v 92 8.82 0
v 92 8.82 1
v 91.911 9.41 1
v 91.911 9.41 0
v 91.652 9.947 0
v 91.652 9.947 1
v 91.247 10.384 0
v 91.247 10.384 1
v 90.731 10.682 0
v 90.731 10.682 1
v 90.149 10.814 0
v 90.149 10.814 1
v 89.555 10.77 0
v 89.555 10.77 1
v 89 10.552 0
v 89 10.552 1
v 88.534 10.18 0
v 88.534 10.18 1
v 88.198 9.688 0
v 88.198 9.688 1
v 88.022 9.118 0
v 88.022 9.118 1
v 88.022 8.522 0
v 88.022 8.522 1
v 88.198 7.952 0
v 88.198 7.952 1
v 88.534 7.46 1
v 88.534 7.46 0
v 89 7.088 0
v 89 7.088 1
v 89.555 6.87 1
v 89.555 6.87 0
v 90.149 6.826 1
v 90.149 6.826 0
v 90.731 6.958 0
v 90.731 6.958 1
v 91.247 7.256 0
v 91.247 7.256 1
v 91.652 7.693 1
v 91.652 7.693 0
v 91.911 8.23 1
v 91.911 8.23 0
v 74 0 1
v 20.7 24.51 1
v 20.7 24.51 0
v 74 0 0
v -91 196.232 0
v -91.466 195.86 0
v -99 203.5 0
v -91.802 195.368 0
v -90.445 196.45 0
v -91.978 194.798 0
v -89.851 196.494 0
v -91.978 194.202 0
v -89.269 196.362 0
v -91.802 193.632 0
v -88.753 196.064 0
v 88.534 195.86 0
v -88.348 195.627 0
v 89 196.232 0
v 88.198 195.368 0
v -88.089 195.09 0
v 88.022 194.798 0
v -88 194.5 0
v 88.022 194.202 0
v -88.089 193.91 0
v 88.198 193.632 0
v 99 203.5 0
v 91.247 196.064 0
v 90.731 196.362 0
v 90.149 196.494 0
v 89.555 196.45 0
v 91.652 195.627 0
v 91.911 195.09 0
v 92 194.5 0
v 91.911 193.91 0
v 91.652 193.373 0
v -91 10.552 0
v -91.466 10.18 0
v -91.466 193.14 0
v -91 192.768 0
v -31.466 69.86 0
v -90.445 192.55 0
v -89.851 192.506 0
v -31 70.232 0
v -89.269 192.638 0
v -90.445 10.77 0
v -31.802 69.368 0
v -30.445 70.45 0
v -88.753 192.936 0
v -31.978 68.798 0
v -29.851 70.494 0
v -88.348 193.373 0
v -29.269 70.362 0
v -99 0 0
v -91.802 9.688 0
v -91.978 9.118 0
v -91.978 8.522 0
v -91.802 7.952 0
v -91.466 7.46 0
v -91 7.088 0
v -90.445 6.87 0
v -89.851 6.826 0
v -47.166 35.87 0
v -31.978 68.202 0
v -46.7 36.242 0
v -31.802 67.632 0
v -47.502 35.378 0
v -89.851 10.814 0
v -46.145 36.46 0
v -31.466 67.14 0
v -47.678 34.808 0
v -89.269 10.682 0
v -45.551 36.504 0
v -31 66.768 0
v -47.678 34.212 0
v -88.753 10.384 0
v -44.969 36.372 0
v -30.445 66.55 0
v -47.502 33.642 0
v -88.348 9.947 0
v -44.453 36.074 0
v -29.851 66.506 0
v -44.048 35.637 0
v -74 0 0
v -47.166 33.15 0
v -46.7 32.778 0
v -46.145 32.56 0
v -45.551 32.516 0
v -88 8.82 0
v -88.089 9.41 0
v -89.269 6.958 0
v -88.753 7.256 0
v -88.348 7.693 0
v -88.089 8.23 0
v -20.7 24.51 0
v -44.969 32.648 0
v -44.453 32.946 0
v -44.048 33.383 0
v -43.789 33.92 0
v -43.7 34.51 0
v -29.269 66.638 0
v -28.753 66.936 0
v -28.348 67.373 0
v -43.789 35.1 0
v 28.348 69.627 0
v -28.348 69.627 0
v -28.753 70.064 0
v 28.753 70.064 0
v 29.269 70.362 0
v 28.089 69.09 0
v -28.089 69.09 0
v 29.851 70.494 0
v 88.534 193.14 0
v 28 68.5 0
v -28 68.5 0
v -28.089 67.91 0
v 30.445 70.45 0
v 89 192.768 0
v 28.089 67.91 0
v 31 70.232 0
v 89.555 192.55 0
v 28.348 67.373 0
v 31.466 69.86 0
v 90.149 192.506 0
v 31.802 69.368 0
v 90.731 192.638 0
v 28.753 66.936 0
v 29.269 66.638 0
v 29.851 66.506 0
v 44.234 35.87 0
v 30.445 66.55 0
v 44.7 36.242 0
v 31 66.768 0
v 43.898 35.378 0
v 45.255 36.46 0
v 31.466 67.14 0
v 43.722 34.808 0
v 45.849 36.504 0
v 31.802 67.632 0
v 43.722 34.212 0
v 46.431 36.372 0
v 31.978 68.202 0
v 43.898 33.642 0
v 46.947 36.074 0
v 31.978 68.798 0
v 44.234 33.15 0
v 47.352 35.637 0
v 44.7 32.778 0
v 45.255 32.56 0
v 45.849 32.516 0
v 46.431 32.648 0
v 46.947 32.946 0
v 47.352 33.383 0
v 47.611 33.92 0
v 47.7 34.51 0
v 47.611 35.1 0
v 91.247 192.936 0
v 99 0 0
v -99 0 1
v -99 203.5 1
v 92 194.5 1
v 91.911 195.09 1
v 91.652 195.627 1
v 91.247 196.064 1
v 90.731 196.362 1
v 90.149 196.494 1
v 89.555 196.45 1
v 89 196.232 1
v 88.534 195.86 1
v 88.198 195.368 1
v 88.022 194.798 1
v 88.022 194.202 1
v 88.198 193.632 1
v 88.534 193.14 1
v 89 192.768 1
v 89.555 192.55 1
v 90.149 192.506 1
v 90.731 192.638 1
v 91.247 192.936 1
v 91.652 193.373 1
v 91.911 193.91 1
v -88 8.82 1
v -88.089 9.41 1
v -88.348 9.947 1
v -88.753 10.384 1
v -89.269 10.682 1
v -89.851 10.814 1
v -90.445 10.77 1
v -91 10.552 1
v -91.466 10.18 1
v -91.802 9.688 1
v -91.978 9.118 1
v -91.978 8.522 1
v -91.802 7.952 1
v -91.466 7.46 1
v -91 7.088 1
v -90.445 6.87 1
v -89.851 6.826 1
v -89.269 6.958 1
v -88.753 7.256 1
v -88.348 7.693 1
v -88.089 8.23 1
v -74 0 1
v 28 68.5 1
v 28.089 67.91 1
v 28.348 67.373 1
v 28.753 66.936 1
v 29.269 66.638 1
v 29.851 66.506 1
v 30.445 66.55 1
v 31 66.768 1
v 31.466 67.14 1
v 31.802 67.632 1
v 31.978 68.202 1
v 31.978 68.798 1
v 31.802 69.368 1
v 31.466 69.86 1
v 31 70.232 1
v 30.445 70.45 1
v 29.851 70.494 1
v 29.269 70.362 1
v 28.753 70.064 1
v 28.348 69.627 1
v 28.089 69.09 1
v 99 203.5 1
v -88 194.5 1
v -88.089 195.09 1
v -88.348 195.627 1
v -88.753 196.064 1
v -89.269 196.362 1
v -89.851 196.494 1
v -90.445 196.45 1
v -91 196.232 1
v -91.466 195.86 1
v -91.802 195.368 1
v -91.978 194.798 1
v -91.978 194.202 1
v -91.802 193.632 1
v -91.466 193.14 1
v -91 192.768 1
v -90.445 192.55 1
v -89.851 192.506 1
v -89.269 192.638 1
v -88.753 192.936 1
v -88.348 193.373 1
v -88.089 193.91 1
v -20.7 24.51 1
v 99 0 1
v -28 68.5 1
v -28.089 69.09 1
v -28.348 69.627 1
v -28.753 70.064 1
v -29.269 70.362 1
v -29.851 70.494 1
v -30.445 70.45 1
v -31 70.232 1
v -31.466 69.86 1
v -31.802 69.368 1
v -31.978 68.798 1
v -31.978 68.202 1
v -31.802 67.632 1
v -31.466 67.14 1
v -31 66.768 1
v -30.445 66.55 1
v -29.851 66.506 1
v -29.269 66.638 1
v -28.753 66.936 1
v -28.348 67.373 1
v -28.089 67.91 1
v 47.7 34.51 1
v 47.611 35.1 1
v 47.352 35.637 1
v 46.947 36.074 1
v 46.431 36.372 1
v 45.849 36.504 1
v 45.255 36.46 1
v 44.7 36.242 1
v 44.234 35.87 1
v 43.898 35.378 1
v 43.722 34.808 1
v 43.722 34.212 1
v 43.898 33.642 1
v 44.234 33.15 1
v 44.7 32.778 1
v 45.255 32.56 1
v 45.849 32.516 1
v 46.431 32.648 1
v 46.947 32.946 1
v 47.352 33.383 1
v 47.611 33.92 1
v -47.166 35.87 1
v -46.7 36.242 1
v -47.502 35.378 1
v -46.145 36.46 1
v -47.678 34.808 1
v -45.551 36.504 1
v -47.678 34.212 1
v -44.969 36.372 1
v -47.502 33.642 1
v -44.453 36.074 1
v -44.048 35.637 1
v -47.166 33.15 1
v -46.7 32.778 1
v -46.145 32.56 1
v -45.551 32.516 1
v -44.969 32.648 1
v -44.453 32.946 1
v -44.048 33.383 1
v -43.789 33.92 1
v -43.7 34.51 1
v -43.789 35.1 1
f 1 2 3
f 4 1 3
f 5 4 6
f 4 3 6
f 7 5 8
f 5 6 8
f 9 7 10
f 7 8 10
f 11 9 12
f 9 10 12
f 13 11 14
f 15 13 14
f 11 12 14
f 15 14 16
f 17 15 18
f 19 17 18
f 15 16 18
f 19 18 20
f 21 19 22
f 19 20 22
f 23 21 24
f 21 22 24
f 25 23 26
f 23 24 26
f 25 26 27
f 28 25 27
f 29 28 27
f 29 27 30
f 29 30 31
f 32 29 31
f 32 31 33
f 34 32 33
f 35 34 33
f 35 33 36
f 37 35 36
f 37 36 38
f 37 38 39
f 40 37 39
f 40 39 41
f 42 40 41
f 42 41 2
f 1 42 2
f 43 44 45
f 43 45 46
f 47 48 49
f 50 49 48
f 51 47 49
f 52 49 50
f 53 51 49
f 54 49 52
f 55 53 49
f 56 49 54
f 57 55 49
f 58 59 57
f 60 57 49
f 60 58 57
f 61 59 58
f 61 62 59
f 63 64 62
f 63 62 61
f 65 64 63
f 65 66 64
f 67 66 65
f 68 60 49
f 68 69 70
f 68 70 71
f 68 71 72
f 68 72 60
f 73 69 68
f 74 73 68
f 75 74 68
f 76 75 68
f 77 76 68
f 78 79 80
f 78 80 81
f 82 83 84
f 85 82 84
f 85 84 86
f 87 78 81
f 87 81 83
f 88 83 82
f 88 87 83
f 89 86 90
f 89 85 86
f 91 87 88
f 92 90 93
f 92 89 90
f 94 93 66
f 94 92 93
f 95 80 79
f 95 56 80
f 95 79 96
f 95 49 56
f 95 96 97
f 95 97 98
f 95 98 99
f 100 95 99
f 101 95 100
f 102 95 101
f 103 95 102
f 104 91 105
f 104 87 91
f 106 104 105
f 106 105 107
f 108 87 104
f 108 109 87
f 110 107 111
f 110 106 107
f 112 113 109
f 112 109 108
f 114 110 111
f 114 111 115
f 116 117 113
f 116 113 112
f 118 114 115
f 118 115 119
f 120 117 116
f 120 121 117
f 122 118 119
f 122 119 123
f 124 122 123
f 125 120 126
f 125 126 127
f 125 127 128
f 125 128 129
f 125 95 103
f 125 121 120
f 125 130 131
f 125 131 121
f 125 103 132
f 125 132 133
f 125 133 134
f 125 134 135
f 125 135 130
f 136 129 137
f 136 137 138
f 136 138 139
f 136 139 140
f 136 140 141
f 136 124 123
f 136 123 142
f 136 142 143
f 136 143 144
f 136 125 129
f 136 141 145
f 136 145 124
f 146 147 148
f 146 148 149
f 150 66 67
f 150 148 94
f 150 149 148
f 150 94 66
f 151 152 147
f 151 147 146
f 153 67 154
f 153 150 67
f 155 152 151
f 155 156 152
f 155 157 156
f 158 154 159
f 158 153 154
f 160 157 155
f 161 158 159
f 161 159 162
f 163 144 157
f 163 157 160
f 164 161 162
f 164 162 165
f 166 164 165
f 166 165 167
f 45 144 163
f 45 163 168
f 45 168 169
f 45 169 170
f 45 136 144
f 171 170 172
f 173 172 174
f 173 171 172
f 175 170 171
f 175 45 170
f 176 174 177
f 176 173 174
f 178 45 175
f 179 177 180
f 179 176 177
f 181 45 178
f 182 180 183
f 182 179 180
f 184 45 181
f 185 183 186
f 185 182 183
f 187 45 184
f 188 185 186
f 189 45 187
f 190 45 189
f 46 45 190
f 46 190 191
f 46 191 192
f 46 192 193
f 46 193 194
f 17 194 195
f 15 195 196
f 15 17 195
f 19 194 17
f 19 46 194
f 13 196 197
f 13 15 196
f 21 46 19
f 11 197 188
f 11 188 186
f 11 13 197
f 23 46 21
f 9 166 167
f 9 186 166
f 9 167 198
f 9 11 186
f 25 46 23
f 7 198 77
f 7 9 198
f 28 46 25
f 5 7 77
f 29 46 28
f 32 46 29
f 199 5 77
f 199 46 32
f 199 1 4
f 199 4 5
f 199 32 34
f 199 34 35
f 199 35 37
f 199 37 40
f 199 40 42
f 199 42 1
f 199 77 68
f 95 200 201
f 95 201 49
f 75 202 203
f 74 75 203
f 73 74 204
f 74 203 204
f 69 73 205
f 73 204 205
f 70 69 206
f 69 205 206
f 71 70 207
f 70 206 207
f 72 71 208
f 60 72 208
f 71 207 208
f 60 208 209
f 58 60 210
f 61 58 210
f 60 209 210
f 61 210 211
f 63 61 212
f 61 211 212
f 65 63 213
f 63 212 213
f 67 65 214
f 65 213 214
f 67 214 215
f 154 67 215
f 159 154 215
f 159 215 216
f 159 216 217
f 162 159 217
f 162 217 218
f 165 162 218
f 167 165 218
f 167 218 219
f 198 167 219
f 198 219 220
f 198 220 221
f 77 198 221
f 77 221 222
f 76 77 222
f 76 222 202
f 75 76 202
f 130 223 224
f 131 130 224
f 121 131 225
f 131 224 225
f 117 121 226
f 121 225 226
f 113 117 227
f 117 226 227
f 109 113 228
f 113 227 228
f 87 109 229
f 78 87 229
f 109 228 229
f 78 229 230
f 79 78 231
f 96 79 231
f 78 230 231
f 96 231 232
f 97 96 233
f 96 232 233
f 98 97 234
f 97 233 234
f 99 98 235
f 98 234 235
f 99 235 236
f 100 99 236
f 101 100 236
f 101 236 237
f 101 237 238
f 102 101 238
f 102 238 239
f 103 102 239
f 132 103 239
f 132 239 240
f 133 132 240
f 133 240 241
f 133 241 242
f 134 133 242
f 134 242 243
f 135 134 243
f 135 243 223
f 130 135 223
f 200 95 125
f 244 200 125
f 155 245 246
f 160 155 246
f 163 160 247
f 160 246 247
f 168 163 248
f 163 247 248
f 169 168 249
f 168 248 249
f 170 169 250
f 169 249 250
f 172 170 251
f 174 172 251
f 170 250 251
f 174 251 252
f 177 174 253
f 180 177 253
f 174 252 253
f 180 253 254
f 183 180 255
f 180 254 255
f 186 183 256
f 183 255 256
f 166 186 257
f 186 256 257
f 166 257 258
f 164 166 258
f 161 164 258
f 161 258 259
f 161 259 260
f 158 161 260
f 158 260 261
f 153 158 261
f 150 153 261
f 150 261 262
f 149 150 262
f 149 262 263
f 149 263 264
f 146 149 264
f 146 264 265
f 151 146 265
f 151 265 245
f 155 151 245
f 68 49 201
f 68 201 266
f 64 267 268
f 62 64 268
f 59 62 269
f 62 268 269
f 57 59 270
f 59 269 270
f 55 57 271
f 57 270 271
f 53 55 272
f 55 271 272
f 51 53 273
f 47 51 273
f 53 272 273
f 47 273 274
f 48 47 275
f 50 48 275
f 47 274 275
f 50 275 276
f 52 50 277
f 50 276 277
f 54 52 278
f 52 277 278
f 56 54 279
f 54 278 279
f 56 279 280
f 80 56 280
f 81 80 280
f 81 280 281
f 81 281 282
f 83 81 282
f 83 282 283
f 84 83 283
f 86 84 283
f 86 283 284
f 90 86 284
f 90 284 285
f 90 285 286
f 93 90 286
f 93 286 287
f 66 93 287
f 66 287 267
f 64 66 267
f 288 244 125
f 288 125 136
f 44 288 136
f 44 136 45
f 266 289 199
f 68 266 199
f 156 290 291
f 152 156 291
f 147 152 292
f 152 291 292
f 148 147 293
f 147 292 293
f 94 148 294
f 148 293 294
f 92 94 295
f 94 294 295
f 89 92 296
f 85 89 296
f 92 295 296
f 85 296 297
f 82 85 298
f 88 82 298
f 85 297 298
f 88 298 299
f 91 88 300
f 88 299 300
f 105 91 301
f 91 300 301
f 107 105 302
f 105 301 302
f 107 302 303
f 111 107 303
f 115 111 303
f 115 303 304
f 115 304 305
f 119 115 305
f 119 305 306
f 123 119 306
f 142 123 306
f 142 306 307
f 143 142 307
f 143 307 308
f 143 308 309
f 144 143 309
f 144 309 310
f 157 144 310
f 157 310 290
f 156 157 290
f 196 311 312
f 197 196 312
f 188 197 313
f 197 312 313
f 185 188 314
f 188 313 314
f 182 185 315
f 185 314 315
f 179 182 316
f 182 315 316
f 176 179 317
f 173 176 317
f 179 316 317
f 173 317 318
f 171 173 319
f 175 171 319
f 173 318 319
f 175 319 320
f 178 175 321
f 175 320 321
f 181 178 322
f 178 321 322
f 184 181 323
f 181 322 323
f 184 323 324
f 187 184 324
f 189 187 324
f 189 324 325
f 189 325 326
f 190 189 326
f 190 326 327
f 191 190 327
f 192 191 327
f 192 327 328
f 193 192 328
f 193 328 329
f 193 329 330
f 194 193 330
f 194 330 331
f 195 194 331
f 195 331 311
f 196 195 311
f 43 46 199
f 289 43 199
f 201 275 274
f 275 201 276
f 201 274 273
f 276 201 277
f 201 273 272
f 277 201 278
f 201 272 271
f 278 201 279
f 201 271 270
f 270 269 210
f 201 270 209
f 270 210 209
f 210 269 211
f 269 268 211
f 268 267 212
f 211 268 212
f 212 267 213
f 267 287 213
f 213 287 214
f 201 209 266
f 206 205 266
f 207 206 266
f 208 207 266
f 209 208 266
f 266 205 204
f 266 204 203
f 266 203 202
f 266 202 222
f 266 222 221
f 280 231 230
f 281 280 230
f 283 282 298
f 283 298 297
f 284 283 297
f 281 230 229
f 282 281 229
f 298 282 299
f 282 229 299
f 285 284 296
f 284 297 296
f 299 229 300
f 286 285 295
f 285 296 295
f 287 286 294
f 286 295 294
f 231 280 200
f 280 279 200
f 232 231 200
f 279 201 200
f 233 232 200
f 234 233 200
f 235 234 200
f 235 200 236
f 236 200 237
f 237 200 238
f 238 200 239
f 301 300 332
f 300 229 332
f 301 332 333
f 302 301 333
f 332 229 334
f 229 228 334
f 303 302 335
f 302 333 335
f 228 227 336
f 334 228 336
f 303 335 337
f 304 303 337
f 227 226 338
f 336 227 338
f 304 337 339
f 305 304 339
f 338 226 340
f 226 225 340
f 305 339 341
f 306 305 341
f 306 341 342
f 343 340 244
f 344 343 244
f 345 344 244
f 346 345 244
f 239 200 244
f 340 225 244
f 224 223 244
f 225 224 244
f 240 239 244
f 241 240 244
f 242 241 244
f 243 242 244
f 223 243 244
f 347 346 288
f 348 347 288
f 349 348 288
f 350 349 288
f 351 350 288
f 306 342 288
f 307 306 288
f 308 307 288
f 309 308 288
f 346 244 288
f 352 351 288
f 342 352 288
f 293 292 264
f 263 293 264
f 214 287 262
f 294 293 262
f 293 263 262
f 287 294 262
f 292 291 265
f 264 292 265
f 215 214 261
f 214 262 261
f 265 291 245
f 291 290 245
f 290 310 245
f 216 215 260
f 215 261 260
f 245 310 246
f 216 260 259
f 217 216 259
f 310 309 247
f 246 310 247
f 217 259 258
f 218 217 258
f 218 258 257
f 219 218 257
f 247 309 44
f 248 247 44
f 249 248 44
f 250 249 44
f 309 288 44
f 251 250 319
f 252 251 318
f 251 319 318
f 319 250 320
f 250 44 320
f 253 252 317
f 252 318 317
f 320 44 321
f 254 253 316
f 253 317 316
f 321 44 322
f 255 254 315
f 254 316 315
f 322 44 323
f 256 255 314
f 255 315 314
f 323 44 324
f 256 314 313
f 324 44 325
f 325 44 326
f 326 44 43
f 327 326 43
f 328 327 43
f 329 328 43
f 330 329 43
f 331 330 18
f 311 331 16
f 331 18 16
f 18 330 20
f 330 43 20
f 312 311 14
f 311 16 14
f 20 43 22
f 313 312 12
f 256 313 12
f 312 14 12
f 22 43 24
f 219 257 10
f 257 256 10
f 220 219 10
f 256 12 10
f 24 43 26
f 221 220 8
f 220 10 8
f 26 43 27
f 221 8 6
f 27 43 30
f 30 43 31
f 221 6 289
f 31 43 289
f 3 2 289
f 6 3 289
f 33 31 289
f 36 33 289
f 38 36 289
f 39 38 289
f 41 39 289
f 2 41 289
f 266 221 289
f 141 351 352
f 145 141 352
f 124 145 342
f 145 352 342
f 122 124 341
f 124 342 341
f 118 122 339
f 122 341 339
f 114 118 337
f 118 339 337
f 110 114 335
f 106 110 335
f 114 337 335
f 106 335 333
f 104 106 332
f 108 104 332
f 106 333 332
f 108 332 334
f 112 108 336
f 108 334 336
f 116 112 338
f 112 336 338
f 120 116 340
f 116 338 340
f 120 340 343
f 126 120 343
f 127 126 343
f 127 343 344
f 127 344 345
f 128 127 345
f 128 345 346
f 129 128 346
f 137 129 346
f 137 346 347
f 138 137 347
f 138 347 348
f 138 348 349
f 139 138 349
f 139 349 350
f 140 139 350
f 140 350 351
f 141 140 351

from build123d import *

# Parameters (mm, degrees)
ESQUISSE2_W               = 198
ESQUISSE2_H               = 1
T_LE_DE_BASE_PLI_E1_DEPTH = 203.5
ESQUISSE7_R               = 2
ENL_V_MAT_EXTRU_1_DEPTH   = 227.305656138
ENL_V_MAT_EXTRU_2_DEPTH   = 227.305656138


# Sheet-metal steps are written as plain solids
with BuildPart() as part:
    # Esquisse2 → Tôle de base pliée1 (new body)
    with BuildSketch(Plane(origin=(0, 0, 0), x_dir=(1, 0, 0), z_dir=(0, 1, 0))):
        with Locations((0, -0.5)):
            Rectangle(ESQUISSE2_W, ESQUISSE2_H)
    extrude(amount=T_LE_DE_BASE_PLI_E1_DEPTH)

    # Esquisse7 → Enlèv. mat.-Extru.1 (cut, through all)
    with BuildSketch(Plane.XY.offset(1)):
        with Locations((-90, 194.5)):
            Circle(ESQUISSE7_R)
        with Locations((90, 194.5)):
            Circle(ESQUISSE7_R)
        with Locations((-90, 8.82)):
            Circle(ESQUISSE7_R)
        with Locations((90, 8.82)):
            Circle(ESQUISSE7_R)
        with Locations((-45.7, 34.51)):
            Circle(ESQUISSE7_R)
        with Locations((45.7, 34.51)):
            Circle(ESQUISSE7_R)
        with Locations((-30, 68.5)):
            Circle(ESQUISSE7_R)
        with Locations(Location((30, 68.5, 0), (0, 0, 180))):
            Circle(ESQUISSE7_R)
    extrude(amount=-ENL_V_MAT_EXTRU_1_DEPTH, mode=Mode.SUBTRACT)

    # Esquisse10 → Enlèv. mat.-Extru.2 (cut, through all)
    with BuildSketch(Plane.XY.offset(1)):
        Polygon((-74, 0), (-20.7, 24.51), (20.7, 24.51), (74, 0), align=None)
    extrude(amount=-ENL_V_MAT_EXTRU_2_DEPTH, mode=Mode.SUBTRACT)


solid = part.part
